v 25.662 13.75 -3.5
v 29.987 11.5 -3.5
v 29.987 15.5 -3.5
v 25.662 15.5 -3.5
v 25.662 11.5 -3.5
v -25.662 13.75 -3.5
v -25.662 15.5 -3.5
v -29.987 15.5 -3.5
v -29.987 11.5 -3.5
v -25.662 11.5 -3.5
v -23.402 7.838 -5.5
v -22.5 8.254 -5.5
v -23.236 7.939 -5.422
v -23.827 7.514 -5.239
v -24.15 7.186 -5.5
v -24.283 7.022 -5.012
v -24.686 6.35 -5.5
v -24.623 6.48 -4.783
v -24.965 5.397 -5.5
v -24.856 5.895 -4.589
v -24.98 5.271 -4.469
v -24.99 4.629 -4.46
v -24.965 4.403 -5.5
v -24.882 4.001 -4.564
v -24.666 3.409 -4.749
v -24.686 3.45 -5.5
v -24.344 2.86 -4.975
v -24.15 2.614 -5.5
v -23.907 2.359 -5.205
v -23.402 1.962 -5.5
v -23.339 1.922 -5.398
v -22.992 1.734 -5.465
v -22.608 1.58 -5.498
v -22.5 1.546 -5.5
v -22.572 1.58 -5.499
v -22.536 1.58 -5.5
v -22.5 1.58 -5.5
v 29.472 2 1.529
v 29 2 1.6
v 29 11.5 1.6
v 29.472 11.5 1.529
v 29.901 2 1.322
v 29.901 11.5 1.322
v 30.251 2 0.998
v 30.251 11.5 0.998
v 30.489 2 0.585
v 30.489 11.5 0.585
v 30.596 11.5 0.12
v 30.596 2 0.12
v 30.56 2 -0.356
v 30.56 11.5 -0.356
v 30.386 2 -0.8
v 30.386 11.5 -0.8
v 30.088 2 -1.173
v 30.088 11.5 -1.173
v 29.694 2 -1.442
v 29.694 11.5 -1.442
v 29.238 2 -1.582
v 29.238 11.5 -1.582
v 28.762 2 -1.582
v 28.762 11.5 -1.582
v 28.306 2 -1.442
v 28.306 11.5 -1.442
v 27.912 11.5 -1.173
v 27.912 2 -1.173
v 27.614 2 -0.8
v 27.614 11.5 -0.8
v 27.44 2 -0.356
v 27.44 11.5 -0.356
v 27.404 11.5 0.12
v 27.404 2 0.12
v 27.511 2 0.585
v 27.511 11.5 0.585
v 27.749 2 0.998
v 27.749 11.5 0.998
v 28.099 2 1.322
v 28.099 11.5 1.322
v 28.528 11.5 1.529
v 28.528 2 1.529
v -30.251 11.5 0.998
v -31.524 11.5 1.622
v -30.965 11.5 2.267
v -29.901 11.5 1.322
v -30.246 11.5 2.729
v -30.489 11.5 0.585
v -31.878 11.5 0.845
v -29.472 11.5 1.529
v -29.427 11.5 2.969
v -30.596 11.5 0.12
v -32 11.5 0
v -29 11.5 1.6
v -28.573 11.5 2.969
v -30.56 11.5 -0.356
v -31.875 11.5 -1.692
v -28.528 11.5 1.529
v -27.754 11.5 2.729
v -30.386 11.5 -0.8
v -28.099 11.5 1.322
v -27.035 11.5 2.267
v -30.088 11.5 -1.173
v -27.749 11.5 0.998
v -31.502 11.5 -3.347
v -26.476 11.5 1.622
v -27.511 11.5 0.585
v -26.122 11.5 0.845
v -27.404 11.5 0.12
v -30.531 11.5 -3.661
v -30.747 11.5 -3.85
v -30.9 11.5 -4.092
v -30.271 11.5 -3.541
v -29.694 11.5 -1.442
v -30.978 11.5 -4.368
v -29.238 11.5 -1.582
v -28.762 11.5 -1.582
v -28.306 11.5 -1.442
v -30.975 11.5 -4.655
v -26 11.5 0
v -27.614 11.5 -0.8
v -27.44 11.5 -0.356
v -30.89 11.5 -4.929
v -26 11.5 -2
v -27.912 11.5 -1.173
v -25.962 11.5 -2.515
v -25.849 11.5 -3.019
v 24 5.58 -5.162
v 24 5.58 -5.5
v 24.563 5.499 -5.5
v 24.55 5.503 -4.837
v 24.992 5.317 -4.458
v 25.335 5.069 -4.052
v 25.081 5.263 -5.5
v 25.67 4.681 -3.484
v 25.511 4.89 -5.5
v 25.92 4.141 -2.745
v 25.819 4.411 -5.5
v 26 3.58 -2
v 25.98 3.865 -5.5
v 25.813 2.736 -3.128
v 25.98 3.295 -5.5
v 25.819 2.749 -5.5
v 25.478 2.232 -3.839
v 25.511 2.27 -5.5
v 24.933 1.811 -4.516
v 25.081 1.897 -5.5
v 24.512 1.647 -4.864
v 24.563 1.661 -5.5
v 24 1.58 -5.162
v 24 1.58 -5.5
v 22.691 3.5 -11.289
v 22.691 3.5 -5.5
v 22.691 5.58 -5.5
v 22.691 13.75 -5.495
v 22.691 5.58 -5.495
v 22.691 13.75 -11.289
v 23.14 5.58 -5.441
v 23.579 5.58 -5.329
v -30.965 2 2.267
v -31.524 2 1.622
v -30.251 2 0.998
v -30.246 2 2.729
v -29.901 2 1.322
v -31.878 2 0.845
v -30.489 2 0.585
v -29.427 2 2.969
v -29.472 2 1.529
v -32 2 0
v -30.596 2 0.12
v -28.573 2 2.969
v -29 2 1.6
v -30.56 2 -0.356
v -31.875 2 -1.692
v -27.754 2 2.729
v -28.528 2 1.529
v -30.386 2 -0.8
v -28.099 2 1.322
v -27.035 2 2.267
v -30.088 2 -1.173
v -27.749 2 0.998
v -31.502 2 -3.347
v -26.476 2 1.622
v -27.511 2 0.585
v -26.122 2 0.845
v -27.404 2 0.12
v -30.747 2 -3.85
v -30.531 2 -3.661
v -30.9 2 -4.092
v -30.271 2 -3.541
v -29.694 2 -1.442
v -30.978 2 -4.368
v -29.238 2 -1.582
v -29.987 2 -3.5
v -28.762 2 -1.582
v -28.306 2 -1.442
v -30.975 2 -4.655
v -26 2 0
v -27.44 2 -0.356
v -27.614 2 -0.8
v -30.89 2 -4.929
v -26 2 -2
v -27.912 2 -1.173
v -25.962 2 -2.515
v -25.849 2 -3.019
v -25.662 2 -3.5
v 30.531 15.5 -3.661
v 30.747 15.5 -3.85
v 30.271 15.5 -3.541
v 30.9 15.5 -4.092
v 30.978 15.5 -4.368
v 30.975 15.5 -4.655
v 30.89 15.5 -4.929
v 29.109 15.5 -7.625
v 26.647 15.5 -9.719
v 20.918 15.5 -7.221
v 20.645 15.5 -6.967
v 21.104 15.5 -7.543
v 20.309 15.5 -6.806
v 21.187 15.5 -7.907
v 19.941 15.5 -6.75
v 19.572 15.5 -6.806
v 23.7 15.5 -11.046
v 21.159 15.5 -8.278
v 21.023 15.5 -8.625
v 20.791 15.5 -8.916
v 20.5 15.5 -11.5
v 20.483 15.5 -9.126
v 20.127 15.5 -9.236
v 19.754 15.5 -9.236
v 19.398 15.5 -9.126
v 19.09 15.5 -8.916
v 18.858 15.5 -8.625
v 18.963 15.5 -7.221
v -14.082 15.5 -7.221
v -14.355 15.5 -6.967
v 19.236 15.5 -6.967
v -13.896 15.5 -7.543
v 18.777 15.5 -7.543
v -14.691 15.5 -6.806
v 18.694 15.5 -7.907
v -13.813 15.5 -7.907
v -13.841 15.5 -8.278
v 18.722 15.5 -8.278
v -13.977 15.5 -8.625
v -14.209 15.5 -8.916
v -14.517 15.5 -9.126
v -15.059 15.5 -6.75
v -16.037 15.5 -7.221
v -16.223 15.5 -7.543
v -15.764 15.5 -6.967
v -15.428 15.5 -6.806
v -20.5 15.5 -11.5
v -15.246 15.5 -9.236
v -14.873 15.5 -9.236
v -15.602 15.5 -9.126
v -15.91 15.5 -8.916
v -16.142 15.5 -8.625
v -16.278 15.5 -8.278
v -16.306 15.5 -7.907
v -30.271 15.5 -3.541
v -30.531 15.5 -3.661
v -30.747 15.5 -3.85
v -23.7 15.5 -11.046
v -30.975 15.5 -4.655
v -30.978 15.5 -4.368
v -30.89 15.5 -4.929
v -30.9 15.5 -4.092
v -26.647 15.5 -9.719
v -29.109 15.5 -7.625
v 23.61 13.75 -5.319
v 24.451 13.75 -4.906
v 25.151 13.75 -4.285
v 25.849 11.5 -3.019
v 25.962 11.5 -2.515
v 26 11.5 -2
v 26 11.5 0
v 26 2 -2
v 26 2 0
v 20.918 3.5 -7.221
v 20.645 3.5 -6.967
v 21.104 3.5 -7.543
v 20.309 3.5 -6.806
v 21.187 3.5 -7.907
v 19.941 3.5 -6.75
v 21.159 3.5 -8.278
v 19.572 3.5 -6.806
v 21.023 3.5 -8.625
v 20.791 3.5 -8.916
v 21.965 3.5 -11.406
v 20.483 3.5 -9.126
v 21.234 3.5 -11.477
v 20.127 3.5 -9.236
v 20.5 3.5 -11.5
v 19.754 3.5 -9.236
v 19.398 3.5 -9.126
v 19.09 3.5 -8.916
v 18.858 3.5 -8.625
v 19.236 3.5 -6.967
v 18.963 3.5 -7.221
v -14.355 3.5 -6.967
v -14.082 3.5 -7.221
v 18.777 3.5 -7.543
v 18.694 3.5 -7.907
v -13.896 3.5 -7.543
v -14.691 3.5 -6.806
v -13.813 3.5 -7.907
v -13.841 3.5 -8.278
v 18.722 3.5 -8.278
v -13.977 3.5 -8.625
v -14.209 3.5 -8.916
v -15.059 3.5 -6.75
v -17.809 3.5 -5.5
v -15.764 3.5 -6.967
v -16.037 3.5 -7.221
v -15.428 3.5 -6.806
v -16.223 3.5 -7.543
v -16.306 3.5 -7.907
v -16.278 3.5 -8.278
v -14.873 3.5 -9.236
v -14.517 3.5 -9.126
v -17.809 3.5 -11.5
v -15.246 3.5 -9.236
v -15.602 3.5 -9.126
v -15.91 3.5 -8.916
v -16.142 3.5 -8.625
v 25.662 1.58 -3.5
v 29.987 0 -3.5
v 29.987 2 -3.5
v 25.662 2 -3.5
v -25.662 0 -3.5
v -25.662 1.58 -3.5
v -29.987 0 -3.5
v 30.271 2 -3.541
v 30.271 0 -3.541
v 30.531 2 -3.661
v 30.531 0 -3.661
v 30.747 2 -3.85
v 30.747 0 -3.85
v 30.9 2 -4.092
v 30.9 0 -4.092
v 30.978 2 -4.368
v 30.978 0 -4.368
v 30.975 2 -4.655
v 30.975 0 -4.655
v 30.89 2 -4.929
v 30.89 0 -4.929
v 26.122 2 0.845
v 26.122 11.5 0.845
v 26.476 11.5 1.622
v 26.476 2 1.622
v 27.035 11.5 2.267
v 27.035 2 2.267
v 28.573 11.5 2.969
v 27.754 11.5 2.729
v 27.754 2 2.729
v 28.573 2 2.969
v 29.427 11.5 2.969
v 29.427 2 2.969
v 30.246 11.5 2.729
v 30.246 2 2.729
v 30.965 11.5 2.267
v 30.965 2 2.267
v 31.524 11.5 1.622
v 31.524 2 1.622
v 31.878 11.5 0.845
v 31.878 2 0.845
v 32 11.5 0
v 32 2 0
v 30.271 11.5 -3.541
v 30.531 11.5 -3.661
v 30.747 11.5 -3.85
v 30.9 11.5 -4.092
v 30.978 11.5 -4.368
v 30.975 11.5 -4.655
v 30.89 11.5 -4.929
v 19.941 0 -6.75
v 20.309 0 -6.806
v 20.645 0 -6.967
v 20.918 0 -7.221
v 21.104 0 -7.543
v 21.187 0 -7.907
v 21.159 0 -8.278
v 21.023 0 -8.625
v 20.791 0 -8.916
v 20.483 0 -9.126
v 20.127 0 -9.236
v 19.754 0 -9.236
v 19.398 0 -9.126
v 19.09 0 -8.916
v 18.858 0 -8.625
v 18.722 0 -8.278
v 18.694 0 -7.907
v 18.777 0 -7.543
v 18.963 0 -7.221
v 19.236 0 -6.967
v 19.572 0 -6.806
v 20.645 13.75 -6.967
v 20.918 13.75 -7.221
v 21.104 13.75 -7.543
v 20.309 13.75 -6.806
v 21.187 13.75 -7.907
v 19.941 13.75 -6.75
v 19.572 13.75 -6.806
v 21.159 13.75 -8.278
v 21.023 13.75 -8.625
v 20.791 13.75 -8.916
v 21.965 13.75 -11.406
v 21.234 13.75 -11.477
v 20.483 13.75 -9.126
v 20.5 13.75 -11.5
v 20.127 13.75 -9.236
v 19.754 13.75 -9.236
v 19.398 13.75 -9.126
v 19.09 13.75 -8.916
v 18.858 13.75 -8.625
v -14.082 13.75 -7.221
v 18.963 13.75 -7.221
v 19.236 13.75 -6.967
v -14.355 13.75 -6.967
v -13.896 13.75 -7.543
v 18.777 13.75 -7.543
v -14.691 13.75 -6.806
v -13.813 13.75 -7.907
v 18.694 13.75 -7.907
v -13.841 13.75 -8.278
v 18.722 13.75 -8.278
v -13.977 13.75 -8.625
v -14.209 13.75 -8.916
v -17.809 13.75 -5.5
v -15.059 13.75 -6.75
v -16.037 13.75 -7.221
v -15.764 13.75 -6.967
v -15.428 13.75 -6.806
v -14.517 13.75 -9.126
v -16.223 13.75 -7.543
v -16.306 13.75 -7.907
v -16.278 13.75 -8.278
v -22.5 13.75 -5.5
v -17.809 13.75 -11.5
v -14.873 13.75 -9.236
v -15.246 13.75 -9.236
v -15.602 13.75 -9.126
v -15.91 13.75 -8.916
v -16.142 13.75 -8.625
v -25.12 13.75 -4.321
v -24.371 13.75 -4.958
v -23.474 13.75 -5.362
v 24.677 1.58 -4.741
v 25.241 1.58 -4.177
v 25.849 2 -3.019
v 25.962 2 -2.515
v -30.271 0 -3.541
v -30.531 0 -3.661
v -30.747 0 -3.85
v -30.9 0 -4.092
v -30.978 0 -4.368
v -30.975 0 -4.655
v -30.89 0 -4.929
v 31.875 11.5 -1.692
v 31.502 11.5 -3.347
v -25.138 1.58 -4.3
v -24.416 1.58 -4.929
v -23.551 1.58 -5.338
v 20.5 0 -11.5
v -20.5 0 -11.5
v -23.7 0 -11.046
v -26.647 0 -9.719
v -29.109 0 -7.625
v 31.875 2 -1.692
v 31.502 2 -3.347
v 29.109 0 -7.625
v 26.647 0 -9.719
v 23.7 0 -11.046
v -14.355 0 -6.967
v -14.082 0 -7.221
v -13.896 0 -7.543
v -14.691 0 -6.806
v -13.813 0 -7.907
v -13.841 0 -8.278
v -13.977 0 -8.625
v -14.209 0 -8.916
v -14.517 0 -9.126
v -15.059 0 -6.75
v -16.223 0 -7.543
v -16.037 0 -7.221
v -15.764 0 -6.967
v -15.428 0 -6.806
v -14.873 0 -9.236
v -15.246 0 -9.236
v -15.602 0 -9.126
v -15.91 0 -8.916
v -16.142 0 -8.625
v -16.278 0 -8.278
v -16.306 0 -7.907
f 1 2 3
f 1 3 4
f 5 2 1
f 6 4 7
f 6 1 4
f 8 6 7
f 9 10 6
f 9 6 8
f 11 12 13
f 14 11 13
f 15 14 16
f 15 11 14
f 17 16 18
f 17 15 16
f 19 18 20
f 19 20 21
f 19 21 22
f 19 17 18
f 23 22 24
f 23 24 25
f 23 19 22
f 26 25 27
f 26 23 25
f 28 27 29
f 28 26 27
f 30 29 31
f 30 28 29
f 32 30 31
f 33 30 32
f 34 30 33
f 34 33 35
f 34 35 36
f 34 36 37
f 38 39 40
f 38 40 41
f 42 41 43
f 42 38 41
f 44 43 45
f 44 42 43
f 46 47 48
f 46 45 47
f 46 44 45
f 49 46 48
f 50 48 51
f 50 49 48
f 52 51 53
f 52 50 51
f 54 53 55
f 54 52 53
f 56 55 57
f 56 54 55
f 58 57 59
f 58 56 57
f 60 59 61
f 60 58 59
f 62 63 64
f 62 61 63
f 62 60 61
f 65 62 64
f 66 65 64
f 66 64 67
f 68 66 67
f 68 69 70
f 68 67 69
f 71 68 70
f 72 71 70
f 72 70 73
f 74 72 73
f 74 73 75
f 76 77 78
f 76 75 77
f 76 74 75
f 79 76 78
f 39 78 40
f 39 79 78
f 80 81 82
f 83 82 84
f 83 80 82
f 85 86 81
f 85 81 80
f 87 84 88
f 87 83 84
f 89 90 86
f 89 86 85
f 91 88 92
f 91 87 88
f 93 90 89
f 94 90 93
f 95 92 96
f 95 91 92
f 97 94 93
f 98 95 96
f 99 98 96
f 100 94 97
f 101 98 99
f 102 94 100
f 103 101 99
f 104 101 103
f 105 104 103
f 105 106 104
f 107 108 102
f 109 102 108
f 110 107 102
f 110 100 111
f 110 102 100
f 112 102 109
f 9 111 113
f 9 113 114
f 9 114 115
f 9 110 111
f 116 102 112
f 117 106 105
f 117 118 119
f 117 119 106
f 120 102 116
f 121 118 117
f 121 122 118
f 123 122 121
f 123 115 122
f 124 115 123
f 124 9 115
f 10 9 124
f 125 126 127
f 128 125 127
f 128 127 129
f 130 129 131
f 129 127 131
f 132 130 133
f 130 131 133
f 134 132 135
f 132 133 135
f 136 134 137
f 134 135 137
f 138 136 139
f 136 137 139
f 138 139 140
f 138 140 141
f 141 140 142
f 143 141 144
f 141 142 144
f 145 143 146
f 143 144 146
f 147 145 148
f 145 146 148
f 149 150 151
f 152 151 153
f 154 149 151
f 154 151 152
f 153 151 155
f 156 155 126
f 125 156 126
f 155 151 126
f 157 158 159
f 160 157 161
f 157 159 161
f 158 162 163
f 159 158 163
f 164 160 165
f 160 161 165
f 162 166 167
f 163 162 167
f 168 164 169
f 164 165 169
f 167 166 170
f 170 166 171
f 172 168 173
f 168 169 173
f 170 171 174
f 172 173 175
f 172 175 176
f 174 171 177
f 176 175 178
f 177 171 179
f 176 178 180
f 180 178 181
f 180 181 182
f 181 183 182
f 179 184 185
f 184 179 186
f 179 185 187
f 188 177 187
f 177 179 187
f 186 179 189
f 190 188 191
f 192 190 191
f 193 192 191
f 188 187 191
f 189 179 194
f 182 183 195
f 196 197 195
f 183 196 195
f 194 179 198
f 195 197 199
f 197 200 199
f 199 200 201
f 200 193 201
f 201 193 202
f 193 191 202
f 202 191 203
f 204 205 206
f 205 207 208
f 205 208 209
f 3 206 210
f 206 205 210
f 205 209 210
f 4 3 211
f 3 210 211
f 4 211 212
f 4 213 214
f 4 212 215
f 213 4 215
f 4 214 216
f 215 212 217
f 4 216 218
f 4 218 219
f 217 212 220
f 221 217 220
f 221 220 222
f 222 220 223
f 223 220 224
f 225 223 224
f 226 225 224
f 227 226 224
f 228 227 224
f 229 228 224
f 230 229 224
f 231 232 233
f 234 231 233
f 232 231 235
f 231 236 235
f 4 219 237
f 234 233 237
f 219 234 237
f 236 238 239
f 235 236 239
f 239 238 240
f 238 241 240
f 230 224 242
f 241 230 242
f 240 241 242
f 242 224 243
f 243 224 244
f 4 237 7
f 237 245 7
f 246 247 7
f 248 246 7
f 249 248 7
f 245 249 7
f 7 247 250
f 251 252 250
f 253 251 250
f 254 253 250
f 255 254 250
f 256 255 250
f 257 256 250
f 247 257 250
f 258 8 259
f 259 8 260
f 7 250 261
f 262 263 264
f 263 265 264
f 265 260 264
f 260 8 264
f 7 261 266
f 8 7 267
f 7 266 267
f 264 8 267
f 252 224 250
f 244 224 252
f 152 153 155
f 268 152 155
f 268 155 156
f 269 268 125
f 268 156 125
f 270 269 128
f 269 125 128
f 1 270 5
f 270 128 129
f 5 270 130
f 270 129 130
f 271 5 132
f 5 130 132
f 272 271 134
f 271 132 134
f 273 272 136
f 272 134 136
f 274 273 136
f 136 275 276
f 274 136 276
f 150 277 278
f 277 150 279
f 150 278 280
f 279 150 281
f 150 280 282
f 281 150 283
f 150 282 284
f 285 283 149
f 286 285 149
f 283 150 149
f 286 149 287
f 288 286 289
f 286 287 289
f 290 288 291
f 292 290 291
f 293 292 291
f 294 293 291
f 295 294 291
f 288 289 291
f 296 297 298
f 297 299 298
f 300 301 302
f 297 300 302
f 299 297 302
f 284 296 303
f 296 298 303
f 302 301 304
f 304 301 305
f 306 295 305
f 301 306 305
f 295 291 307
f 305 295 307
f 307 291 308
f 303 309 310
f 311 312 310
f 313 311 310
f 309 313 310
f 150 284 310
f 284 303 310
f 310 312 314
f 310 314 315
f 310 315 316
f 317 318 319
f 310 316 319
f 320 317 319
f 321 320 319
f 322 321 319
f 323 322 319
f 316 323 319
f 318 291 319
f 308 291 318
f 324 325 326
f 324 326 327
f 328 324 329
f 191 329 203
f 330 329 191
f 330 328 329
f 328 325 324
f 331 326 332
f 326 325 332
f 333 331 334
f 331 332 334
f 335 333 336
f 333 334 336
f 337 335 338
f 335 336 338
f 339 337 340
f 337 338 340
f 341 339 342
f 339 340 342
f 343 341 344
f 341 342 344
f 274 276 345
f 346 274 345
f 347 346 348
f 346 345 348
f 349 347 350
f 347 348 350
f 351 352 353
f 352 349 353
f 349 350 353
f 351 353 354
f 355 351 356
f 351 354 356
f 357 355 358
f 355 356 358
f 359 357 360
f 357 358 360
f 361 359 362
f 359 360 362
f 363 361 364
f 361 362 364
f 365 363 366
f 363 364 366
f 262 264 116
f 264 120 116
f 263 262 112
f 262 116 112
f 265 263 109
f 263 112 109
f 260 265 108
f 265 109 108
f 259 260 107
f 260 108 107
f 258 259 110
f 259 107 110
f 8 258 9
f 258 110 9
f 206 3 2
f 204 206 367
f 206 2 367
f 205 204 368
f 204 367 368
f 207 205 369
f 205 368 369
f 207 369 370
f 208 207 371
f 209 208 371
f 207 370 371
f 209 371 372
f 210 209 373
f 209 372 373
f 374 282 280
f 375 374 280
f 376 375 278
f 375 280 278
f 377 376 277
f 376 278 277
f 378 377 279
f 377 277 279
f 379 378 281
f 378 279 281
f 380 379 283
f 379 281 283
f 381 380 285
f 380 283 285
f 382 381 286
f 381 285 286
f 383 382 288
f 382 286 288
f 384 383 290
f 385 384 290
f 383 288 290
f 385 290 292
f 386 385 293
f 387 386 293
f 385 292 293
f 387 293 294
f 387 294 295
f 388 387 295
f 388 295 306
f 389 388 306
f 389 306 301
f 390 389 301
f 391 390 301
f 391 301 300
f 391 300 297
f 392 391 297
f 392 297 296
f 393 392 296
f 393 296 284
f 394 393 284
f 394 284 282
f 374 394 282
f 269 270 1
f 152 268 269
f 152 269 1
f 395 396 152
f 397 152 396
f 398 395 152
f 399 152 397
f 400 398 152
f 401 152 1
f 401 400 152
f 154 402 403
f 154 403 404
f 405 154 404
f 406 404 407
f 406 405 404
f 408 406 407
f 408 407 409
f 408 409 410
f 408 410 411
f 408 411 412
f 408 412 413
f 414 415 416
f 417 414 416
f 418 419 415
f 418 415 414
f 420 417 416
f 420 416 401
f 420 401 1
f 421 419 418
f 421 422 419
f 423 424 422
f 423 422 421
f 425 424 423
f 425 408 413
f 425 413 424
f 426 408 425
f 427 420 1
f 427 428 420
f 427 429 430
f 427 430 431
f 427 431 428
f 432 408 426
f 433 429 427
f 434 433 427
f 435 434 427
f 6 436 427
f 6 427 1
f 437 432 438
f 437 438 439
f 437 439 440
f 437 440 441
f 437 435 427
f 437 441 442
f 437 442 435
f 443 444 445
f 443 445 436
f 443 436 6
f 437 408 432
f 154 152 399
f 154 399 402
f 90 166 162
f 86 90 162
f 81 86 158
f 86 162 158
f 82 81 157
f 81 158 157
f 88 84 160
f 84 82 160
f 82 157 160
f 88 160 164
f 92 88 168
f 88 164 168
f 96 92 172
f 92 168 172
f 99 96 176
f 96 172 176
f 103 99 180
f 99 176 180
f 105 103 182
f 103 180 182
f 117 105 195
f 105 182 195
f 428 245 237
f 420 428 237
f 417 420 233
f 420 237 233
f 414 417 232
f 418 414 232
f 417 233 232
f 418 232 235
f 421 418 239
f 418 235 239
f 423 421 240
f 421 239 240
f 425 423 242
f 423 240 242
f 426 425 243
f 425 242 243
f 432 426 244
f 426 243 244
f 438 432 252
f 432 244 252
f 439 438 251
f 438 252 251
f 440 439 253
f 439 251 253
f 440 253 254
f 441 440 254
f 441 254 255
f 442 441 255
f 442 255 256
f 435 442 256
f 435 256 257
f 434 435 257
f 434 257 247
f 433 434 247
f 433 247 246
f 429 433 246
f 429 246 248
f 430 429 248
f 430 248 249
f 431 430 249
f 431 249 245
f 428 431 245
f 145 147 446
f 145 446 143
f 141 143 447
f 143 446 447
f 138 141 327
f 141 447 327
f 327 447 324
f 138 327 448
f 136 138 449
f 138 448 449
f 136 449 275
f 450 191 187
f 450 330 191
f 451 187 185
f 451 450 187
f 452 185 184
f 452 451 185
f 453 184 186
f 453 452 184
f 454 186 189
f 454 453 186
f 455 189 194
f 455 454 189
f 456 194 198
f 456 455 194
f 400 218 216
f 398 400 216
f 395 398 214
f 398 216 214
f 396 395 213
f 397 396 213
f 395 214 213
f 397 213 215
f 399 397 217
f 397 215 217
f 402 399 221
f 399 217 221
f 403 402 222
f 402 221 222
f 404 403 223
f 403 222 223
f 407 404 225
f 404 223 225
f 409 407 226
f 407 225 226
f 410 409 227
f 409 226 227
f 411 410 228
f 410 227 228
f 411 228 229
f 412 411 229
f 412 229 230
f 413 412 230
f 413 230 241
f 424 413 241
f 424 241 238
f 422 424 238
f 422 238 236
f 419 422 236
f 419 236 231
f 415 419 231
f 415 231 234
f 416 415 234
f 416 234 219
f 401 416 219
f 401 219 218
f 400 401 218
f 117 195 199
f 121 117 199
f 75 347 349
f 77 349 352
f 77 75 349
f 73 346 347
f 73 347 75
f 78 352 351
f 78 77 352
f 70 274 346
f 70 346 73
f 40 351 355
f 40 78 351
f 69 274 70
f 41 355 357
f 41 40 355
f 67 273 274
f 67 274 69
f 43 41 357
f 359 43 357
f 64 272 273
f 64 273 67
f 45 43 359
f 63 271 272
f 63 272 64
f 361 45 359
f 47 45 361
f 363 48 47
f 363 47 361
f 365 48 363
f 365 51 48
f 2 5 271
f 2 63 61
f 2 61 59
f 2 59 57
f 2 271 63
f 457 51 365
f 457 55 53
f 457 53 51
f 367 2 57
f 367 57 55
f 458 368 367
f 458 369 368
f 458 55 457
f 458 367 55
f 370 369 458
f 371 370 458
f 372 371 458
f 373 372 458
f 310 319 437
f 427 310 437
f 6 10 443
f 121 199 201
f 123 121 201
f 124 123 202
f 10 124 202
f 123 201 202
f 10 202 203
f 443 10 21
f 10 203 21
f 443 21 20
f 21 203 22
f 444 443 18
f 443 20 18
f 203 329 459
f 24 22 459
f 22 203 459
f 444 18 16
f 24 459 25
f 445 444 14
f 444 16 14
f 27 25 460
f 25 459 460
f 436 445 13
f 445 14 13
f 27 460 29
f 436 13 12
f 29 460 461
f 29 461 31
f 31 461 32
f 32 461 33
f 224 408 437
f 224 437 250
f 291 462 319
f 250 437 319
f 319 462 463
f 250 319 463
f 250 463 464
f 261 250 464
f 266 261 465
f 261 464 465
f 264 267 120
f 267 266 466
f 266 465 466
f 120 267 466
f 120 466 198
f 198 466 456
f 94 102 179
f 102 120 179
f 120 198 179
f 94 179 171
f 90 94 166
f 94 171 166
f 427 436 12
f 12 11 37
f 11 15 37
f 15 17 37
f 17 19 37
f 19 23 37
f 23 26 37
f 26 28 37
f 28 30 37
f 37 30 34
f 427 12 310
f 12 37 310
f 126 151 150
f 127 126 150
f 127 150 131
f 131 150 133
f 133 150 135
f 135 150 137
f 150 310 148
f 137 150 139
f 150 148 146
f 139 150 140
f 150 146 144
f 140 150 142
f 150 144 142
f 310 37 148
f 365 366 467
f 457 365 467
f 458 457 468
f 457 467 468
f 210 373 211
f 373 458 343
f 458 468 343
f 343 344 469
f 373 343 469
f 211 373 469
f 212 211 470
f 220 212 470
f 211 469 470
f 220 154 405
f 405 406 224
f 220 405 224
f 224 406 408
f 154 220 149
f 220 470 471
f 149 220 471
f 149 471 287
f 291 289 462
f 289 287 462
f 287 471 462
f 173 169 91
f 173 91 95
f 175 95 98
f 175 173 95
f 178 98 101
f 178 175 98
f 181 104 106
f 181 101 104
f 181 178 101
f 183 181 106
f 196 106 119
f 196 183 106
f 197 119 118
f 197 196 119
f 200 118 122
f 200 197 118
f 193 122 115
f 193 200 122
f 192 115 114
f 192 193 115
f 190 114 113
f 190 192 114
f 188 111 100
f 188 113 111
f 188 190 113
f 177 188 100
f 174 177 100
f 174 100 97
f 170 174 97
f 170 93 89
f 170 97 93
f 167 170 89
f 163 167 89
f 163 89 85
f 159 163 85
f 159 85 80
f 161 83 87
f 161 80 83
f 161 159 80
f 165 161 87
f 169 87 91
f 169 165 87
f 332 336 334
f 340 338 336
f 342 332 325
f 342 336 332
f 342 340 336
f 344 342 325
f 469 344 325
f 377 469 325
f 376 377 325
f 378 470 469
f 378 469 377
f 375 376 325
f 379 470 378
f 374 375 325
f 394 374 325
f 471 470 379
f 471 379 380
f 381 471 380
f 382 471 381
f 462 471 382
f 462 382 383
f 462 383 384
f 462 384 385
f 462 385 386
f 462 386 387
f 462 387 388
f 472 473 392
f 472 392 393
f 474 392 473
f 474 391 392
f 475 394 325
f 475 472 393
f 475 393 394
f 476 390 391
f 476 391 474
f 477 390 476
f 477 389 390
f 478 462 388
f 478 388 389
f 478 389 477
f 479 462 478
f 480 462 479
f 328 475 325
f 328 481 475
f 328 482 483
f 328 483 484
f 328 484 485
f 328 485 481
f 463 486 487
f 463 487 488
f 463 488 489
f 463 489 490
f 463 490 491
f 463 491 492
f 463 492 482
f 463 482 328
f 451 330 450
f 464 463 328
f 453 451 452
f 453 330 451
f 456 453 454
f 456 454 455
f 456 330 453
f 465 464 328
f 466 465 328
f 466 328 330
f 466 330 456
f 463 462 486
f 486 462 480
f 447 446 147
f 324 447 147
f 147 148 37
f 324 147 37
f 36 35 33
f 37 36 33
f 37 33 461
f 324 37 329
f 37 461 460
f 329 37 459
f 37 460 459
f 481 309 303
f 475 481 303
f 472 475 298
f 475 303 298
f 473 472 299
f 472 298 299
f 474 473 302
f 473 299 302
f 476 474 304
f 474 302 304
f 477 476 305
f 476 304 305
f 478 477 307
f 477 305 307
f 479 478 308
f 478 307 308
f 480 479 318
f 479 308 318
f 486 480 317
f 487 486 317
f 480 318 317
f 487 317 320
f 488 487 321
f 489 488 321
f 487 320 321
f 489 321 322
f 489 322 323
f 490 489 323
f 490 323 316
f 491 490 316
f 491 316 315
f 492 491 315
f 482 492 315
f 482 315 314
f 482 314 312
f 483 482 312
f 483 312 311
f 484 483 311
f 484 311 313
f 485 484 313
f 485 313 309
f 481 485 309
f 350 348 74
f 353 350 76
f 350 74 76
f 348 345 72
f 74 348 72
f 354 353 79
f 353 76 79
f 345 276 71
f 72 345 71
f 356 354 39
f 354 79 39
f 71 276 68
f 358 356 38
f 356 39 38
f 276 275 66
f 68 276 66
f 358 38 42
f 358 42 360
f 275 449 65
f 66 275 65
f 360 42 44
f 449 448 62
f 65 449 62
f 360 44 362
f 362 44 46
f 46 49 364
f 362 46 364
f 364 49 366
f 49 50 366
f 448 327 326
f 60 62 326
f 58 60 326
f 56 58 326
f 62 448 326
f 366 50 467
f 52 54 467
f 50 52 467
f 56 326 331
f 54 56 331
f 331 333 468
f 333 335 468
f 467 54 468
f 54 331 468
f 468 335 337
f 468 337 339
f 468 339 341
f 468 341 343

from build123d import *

# Parameters (mm, degrees)
ESQUISSE1_R             = 1.6
BOSS_EXTRU_1_DEPTH      = 15.5
ESQUISSE2_W             = 88.683684882
ESQUISSE2_H             = 17.311737923
ENL_V_MAT_EXTRU_1_DEPTH = 4
ENL_V_START             = -15.5
ESQUISSE2_2_W           = 88.683684882
ESQUISSE2_2_H           = 17.311737923
ENL_V_MAT_EXTRU_2_DEPTH = 2
ESQUISSE3_W             = 40.5
ESQUISSE3_H             = 10.25
ENL_V_MAT_EXTRU_3_DEPTH = 39.399218742
ESQUISSE4_R             = 1.25
ENL_V_MAT_EXTRU_4_DEPTH = 38.369773882
ESQUISSE5_R             = 3.5
ENL_V_MAT_EXTRU_5_DEPTH = 37.558172821
BOSS_EXTRU_2_START      = -1.75
BOSS_EXTRU_2_DEPTH      = 1.75
BOSS_EXTRU_3_START      = -15.5
BOSS_EXTRU_3_DEPTH      = 1.58
CONG_1_R                = 1


with BuildPart() as part:
    # Esquisse1 → Boss.-Extru.1 (new body)
    with BuildSketch(Plane(origin=(0, 0, 0), x_dir=(1, 0, 0), z_dir=(0, 1, 0))):
        with BuildLine():
            Line((-22.5, 5.5), (22.5, 5.5))
            ThreePointArc((22.5, 5.5), (24.974873734, 4.474873734), (26, 2))
            Line((26, 2), (26, 0))
            ThreePointArc((26, 0), (29, -3), (32, 0))
            ThreePointArc((32, 0), (28.631727984, 8.131727984), (20.5, 11.5))
            Line((20.5, 11.5), (-20.5, 11.5))
            ThreePointArc((-20.5, 11.5), (-28.631727984, 8.131727984), (-32, 0))
            ThreePointArc((-32, 0), (-29, -3), (-26, 0))
            Line((-26, 0), (-26, 2))
            ThreePointArc((-26, 2), (-24.974873734, 4.474873734), (-22.5, 5.5))
        make_face()
        with Locations(Location((-29, 0, 0), (0, 0, 270))):
            Circle(ESQUISSE1_R, mode=Mode.SUBTRACT)
        with Locations(Location((29, 0, 0), (0, 0, 270))):
            Circle(ESQUISSE1_R, mode=Mode.SUBTRACT)
    extrude(amount=BOSS_EXTRU_1_DEPTH)

    # Esquisse2 → Enlèv. mat.-Extru.1 (cut)
    with BuildSketch(Plane(origin=(0, 15.5, 0), x_dir=(1, 0, 0), z_dir=(0, 1, 0))):
        with Locations((-5.127432495, -5.155868962)):
            Rectangle(ESQUISSE2_W, ESQUISSE2_H)
    extrude(amount=-ENL_V_MAT_EXTRU_1_DEPTH, mode=Mode.SUBTRACT)

    # Esquisse2<2> → Enlèv. mat.-Extru.2 (cut)
    with BuildSketch(Plane(origin=(0, 15.5, 0), x_dir=(1, 0, 0), z_dir=(0, 1, 0)).offset(ENL_V_START)):
        with Locations((-5.127432495, -5.155868962)):
            Rectangle(ESQUISSE2_2_W, ESQUISSE2_2_H)
    extrude(amount=ENL_V_MAT_EXTRU_2_DEPTH, mode=Mode.SUBTRACT)

    # Esquisse3 → Enlèv. mat.-Extru.3 (cut, through all)
    with BuildSketch(Plane(origin=(0, 0, -11.5), x_dir=(-1, 0, 0), z_dir=(0, 0, -1))):
        with Locations((-2.440596151, 8.625)):
            Rectangle(ESQUISSE3_W, ESQUISSE3_H)
    extrude(amount=-ENL_V_MAT_EXTRU_3_DEPTH, mode=Mode.SUBTRACT)

    # Esquisse4 → Enlèv. mat.-Extru.4 (cut, through all)
    with BuildSketch(Plane(origin=(0, 15.5, 0), x_dir=(1, 0, 0), z_dir=(0, 1, 0))):
        with Locations(Location((19.940596151, 8, 0), (0, 0, 270))):
            Circle(ESQUISSE4_R)
        with Locations(Location((-15.059403849, 8, 0), (0, 0, 270))):
            Circle(ESQUISSE4_R)
    extrude(amount=-ENL_V_MAT_EXTRU_4_DEPTH, mode=Mode.SUBTRACT)

    # Esquisse5 → Enlèv. mat.-Extru.5 (cut, through all)
    with BuildSketch(Plane.XY.offset(-5.5)):
        with Locations((-21.5, 4.9)):
            Circle(ESQUISSE5_R)
        with BuildLine():
            Line((13.351466812, 5.58), (24, 5.58))
            ThreePointArc((24, 5.58), (26, 3.58), (24, 1.58))
            Line((24, 1.58), (13.351466812, 1.58))
            ThreePointArc((13.351466812, 1.58), (11.351466812, 3.58), (13.351466812, 5.58))
        make_face()
    extrude(amount=ENL_V_MAT_EXTRU_5_DEPTH, mode=Mode.SUBTRACT)

    # Esquisse6 → Boss.-Extru.2 (add)
    with BuildSketch(Plane(origin=(0, 15.5, 0), x_dir=(1, 0, 0), z_dir=(0, 1, 0)).offset(BOSS_EXTRU_2_START)):
        with BuildLine():
            Line((-22.5, 5.5), (22.5, 5.5))
            ThreePointArc((22.5, 5.5), (24.370828693, 4.958039892), (25.66227766, 3.5))
            Line((25.66227766, 3.5), (-25.66227766, 3.5))
            ThreePointArc((-25.66227766, 3.5), (-24.370828693, 4.958039892), (-22.5, 5.5))
        make_face()
    extrude(amount=BOSS_EXTRU_2_DEPTH)

    # Esquisse6<2> → Boss.-Extru.3 (add)
    with BuildSketch(Plane(origin=(0, 15.5, 0), x_dir=(1, 0, 0), z_dir=(0, 1, 0)).offset(BOSS_EXTRU_3_START)):
        with BuildLine():
            Line((-22.5, 5.5), (22.5, 5.5))
            ThreePointArc((22.5, 5.5), (24.370828693, 4.958039892), (25.66227766, 3.5))
            Line((25.66227766, 3.5), (-25.66227766, 3.5))
            ThreePointArc((-25.66227766, 3.5), (-24.370828693, 4.958039892), (-22.5, 5.5))
        make_face()
    extrude(amount=BOSS_EXTRU_3_DEPTH)

    # Congé1
    cong_1_edges = [part.edges().sort_by_distance(p)[0] for p in [
        (-31.45445115, 13.5, -3.5),
        (31.45445115, 13.5, -3.5),
        (-31.45445115, 1, -3.5),
        (31.45445115, 1, -3.5),
    ]]
    fillet(cong_1_edges, radius=CONG_1_R)


solid = part.part
